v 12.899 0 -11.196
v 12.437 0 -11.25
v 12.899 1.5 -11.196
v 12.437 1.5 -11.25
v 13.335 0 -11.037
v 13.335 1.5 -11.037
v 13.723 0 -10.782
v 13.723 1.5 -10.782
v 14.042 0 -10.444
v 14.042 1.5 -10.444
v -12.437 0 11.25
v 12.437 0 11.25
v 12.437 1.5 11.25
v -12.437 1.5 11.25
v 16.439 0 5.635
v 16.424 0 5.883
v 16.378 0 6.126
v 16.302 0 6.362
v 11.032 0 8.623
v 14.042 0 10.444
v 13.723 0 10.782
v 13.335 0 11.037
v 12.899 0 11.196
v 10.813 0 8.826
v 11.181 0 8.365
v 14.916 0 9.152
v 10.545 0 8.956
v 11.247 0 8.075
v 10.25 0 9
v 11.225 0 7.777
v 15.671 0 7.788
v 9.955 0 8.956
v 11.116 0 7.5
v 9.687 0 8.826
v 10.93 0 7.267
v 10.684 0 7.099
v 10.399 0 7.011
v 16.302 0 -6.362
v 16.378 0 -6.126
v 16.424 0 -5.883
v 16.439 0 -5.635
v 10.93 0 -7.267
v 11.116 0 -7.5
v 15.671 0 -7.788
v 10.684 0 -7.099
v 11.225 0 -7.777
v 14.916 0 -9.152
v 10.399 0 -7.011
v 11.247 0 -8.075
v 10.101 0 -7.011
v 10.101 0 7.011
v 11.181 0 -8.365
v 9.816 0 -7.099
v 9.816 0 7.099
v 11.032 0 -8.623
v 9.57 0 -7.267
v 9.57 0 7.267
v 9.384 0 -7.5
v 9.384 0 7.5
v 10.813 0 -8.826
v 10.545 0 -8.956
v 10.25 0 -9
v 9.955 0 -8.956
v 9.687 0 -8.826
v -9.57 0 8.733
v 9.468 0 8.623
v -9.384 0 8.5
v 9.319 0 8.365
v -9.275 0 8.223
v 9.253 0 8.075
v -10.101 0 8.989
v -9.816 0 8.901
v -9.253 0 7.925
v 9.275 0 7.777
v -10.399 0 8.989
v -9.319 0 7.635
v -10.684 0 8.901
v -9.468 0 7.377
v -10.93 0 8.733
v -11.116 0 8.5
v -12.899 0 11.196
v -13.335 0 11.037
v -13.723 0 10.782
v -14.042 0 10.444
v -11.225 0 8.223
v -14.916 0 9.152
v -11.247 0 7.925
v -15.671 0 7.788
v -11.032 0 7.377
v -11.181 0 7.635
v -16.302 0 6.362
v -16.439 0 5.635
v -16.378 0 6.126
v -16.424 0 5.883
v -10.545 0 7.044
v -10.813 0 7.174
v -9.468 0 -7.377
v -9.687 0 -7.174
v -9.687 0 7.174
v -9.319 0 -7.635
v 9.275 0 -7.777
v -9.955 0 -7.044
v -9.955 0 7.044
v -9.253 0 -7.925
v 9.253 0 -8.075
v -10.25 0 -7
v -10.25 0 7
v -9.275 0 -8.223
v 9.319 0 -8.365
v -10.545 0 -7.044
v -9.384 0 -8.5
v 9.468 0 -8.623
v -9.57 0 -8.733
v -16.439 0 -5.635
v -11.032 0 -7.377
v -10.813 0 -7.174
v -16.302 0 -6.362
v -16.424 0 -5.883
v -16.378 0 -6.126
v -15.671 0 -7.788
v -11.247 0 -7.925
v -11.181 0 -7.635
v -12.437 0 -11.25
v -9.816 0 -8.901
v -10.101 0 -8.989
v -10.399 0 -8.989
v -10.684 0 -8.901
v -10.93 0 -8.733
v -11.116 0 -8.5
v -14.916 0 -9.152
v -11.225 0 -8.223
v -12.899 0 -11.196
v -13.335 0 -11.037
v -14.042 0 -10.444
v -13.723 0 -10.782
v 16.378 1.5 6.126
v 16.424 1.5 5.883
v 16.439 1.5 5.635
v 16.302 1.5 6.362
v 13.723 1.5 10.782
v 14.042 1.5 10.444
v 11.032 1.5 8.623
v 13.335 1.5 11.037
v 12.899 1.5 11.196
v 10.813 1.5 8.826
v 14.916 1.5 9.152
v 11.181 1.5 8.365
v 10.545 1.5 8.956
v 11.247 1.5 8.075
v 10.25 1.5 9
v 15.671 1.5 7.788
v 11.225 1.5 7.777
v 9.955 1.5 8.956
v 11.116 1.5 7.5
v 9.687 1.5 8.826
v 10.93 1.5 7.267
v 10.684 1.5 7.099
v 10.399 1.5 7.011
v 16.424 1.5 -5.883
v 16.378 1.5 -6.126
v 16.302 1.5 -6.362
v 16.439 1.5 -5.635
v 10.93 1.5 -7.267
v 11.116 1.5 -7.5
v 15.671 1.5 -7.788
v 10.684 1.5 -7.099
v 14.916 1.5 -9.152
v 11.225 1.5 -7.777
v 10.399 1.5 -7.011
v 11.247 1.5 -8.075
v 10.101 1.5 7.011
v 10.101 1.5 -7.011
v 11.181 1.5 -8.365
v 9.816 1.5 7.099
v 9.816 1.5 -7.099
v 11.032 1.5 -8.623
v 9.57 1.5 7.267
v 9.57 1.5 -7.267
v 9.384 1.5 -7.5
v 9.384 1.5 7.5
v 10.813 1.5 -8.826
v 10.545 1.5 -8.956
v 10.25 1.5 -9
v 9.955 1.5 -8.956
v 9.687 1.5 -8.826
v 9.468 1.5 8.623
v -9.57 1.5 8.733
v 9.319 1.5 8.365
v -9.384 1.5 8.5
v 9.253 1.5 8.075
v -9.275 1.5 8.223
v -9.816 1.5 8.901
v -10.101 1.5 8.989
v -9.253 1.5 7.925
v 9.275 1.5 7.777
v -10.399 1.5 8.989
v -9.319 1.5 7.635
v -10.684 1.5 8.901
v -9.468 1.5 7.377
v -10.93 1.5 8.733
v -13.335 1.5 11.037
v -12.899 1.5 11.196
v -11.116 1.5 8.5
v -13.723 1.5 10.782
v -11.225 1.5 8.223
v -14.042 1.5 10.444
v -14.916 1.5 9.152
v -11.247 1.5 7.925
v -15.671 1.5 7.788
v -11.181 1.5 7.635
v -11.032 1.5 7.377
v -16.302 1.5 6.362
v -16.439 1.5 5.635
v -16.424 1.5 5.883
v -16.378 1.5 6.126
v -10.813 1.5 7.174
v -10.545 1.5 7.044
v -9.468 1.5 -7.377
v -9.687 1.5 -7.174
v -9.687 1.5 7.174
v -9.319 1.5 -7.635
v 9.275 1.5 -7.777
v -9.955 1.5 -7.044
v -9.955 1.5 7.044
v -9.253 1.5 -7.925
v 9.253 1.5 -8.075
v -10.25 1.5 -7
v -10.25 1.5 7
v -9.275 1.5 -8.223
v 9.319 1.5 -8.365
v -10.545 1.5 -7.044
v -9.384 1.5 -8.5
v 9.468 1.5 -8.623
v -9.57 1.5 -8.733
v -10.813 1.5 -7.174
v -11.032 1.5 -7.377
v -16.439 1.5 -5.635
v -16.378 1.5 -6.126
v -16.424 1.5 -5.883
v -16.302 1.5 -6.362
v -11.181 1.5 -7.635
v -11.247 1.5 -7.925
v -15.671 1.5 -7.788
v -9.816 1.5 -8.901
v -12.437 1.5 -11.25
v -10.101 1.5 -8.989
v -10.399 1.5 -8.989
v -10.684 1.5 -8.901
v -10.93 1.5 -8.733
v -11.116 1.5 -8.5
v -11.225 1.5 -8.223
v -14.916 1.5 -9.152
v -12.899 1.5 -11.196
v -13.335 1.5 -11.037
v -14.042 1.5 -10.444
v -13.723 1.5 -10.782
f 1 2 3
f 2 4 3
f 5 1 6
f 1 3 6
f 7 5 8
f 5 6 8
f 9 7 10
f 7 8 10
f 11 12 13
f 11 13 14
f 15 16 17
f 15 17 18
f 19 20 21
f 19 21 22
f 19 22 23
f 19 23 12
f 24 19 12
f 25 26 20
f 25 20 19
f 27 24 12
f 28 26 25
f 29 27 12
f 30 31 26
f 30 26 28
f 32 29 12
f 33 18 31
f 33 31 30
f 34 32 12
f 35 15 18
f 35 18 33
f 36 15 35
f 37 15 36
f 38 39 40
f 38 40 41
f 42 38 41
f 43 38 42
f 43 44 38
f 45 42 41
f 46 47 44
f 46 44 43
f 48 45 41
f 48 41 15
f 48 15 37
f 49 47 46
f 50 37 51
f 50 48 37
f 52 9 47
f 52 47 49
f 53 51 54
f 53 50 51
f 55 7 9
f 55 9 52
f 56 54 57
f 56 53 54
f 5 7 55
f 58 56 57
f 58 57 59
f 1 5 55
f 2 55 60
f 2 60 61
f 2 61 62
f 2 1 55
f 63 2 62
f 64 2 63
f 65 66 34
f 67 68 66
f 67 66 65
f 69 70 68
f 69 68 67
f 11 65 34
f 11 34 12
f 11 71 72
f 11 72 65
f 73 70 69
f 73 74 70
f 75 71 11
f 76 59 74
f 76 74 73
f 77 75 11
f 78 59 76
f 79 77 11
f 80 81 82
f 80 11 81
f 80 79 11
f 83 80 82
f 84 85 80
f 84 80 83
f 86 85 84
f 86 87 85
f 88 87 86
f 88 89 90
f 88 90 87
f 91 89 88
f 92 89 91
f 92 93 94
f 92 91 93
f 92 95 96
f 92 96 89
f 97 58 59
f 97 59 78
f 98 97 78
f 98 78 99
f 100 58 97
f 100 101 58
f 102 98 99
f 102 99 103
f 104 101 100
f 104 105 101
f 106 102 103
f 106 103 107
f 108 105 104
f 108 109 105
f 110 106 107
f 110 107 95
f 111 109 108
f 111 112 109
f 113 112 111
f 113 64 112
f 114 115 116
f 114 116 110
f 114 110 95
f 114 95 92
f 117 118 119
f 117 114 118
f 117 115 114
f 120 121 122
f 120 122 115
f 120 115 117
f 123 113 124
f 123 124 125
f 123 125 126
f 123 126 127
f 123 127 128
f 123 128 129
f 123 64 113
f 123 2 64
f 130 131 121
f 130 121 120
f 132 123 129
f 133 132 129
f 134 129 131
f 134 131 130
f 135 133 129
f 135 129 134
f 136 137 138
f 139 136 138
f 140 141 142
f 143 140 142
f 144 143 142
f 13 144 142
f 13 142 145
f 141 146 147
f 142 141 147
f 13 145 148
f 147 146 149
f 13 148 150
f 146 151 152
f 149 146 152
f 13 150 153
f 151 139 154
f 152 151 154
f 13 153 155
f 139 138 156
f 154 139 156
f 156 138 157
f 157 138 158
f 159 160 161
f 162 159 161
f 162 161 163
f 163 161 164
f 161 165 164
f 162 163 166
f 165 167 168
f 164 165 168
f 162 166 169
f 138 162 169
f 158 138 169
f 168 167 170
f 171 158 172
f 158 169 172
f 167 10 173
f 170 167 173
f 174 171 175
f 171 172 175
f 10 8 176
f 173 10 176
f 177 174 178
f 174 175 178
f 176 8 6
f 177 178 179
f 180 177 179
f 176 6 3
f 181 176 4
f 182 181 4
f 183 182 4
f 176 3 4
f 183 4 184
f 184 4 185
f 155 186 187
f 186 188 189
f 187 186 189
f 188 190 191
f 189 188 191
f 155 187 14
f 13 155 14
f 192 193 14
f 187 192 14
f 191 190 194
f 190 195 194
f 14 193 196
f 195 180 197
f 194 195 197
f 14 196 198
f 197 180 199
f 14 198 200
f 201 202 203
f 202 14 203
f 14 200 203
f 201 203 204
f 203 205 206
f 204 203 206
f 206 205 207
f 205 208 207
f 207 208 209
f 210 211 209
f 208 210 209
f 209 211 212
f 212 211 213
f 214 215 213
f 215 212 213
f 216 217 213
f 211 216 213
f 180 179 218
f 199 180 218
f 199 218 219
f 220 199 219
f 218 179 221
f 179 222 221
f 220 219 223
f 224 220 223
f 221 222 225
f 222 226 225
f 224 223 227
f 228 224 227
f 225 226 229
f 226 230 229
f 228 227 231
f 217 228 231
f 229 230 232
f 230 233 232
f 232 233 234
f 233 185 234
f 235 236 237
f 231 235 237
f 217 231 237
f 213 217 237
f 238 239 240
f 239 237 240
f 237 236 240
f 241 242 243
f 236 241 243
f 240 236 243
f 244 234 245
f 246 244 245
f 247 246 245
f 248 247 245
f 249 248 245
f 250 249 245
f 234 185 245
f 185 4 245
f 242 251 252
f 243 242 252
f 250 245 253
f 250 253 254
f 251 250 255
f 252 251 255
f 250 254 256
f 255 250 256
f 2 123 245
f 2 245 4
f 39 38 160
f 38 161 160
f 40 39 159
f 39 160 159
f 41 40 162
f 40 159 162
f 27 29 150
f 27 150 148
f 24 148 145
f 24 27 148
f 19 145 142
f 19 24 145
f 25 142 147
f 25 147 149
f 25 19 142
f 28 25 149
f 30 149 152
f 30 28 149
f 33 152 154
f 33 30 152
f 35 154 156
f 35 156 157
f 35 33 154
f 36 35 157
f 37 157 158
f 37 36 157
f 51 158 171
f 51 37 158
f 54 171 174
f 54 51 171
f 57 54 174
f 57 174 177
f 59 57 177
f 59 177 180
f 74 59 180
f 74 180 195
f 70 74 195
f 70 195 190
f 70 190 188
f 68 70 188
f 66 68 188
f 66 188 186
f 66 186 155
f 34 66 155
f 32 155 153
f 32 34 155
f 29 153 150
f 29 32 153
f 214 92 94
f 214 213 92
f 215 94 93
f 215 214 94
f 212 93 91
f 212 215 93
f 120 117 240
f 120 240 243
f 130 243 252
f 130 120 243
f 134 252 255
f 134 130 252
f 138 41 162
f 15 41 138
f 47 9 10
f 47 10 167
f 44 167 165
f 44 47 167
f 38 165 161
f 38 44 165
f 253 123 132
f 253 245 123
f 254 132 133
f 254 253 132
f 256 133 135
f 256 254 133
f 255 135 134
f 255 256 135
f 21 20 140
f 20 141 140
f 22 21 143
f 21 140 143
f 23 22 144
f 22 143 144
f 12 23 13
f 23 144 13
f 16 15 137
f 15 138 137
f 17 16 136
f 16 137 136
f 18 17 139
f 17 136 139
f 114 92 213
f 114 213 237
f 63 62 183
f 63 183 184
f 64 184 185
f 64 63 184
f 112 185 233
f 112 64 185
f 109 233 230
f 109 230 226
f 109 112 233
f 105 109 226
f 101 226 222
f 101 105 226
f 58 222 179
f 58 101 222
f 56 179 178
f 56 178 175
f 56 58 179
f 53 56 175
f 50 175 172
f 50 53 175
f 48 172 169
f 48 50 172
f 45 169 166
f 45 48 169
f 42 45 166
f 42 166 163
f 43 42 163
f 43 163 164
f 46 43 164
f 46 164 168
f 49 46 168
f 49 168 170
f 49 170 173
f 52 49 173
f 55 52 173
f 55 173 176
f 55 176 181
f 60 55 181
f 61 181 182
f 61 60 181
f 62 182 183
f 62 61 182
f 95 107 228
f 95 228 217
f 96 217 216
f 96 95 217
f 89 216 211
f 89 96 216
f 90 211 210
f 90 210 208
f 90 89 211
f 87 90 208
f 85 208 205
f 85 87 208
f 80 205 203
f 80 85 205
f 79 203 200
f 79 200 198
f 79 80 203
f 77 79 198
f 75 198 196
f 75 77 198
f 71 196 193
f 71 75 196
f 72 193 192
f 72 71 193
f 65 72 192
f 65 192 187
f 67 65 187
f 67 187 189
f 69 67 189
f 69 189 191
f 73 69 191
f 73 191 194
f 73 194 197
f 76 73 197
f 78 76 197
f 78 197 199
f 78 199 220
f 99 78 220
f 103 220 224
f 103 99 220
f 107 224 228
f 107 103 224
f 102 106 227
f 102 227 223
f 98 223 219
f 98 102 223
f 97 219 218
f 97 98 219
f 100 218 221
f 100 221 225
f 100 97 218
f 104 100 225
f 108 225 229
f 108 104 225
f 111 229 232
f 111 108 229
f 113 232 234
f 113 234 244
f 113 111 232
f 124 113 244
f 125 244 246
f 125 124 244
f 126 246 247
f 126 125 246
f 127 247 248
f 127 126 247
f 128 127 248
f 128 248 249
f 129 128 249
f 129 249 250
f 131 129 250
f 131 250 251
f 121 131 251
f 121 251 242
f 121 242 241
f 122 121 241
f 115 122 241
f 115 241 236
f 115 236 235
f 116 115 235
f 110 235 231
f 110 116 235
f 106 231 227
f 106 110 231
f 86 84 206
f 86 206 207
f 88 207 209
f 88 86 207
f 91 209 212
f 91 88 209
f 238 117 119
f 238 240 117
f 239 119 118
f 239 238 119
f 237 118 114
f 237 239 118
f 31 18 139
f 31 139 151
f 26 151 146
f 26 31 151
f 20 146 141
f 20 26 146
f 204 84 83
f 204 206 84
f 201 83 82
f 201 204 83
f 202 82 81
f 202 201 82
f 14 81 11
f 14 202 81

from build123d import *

# Parameters (mm, degrees)
SKETCH_1_R      = 1
EXTRUDE_1_DEPTH = 1.5
FILLET_1_R      = 2


with BuildPart() as part:
    # 草图1 → 凸台-拉伸1 (new body)
    with BuildSketch(Plane(origin=(0, 0, 0), x_dir=(1, 0, 0), z_dir=(0, 1, 0))):
        with BuildLine():
            Line((-13.404756618, 11.25), (13.404756618, 11.25))
            ThreePointArc((13.404756618, 11.25), (15.151148095, 8.757437491), (16.439282223, 6))
            Line((16.439282223, 6), (16.439282223, -6))
            ThreePointArc((16.439282223, -6), (15.151148095, -8.757437491), (13.404756618, -11.25))
            Line((13.404756618, -11.25), (-13.404756618, -11.25))
            ThreePointArc((-13.404756618, -11.25), (-15.151148095, -8.757437491), (-16.439282223, -6))
            Line((-16.439282223, -6), (-16.439282223, 6))
            ThreePointArc((-16.439282223, 6), (-15.151148095, 8.757437491), (-13.404756618, 11.25))
        make_face()
        with Locations(Location((10.25, -8, 0), (0, 0, 270))):
            Circle(SKETCH_1_R, mode=Mode.SUBTRACT)
        with Locations(Location((-10.25, -8, 0), (0, 0, 90))):
            Circle(SKETCH_1_R, mode=Mode.SUBTRACT)
        with Locations(Location((-10.25, 8, 0), (0, 0, 270))):
            Circle(SKETCH_1_R, mode=Mode.SUBTRACT)
        with Locations(Location((10.25, 8, 0), (0, 0, 90))):
            Circle(SKETCH_1_R, mode=Mode.SUBTRACT)
    extrude(amount=EXTRUDE_1_DEPTH)

    # 圆角1
    fillet_1_edges = [part.edges().sort_by_distance(p)[0] for p in [
        (-13.404756618, 0.75, -11.25),
        (13.404756618, 0.75, -11.25),
        (16.439282223, 0.75, -6),
        (16.439282223, 0.75, 6),
        (13.404756618, 0.75, 11.25),
        (-13.404756618, 0.75, 11.25),
        (-16.439282223, 0.75, 6),
        (-16.439282223, 0.75, -6),
    ]]
    fillet(fillet_1_edges, radius=FILLET_1_R)


solid = part.part
